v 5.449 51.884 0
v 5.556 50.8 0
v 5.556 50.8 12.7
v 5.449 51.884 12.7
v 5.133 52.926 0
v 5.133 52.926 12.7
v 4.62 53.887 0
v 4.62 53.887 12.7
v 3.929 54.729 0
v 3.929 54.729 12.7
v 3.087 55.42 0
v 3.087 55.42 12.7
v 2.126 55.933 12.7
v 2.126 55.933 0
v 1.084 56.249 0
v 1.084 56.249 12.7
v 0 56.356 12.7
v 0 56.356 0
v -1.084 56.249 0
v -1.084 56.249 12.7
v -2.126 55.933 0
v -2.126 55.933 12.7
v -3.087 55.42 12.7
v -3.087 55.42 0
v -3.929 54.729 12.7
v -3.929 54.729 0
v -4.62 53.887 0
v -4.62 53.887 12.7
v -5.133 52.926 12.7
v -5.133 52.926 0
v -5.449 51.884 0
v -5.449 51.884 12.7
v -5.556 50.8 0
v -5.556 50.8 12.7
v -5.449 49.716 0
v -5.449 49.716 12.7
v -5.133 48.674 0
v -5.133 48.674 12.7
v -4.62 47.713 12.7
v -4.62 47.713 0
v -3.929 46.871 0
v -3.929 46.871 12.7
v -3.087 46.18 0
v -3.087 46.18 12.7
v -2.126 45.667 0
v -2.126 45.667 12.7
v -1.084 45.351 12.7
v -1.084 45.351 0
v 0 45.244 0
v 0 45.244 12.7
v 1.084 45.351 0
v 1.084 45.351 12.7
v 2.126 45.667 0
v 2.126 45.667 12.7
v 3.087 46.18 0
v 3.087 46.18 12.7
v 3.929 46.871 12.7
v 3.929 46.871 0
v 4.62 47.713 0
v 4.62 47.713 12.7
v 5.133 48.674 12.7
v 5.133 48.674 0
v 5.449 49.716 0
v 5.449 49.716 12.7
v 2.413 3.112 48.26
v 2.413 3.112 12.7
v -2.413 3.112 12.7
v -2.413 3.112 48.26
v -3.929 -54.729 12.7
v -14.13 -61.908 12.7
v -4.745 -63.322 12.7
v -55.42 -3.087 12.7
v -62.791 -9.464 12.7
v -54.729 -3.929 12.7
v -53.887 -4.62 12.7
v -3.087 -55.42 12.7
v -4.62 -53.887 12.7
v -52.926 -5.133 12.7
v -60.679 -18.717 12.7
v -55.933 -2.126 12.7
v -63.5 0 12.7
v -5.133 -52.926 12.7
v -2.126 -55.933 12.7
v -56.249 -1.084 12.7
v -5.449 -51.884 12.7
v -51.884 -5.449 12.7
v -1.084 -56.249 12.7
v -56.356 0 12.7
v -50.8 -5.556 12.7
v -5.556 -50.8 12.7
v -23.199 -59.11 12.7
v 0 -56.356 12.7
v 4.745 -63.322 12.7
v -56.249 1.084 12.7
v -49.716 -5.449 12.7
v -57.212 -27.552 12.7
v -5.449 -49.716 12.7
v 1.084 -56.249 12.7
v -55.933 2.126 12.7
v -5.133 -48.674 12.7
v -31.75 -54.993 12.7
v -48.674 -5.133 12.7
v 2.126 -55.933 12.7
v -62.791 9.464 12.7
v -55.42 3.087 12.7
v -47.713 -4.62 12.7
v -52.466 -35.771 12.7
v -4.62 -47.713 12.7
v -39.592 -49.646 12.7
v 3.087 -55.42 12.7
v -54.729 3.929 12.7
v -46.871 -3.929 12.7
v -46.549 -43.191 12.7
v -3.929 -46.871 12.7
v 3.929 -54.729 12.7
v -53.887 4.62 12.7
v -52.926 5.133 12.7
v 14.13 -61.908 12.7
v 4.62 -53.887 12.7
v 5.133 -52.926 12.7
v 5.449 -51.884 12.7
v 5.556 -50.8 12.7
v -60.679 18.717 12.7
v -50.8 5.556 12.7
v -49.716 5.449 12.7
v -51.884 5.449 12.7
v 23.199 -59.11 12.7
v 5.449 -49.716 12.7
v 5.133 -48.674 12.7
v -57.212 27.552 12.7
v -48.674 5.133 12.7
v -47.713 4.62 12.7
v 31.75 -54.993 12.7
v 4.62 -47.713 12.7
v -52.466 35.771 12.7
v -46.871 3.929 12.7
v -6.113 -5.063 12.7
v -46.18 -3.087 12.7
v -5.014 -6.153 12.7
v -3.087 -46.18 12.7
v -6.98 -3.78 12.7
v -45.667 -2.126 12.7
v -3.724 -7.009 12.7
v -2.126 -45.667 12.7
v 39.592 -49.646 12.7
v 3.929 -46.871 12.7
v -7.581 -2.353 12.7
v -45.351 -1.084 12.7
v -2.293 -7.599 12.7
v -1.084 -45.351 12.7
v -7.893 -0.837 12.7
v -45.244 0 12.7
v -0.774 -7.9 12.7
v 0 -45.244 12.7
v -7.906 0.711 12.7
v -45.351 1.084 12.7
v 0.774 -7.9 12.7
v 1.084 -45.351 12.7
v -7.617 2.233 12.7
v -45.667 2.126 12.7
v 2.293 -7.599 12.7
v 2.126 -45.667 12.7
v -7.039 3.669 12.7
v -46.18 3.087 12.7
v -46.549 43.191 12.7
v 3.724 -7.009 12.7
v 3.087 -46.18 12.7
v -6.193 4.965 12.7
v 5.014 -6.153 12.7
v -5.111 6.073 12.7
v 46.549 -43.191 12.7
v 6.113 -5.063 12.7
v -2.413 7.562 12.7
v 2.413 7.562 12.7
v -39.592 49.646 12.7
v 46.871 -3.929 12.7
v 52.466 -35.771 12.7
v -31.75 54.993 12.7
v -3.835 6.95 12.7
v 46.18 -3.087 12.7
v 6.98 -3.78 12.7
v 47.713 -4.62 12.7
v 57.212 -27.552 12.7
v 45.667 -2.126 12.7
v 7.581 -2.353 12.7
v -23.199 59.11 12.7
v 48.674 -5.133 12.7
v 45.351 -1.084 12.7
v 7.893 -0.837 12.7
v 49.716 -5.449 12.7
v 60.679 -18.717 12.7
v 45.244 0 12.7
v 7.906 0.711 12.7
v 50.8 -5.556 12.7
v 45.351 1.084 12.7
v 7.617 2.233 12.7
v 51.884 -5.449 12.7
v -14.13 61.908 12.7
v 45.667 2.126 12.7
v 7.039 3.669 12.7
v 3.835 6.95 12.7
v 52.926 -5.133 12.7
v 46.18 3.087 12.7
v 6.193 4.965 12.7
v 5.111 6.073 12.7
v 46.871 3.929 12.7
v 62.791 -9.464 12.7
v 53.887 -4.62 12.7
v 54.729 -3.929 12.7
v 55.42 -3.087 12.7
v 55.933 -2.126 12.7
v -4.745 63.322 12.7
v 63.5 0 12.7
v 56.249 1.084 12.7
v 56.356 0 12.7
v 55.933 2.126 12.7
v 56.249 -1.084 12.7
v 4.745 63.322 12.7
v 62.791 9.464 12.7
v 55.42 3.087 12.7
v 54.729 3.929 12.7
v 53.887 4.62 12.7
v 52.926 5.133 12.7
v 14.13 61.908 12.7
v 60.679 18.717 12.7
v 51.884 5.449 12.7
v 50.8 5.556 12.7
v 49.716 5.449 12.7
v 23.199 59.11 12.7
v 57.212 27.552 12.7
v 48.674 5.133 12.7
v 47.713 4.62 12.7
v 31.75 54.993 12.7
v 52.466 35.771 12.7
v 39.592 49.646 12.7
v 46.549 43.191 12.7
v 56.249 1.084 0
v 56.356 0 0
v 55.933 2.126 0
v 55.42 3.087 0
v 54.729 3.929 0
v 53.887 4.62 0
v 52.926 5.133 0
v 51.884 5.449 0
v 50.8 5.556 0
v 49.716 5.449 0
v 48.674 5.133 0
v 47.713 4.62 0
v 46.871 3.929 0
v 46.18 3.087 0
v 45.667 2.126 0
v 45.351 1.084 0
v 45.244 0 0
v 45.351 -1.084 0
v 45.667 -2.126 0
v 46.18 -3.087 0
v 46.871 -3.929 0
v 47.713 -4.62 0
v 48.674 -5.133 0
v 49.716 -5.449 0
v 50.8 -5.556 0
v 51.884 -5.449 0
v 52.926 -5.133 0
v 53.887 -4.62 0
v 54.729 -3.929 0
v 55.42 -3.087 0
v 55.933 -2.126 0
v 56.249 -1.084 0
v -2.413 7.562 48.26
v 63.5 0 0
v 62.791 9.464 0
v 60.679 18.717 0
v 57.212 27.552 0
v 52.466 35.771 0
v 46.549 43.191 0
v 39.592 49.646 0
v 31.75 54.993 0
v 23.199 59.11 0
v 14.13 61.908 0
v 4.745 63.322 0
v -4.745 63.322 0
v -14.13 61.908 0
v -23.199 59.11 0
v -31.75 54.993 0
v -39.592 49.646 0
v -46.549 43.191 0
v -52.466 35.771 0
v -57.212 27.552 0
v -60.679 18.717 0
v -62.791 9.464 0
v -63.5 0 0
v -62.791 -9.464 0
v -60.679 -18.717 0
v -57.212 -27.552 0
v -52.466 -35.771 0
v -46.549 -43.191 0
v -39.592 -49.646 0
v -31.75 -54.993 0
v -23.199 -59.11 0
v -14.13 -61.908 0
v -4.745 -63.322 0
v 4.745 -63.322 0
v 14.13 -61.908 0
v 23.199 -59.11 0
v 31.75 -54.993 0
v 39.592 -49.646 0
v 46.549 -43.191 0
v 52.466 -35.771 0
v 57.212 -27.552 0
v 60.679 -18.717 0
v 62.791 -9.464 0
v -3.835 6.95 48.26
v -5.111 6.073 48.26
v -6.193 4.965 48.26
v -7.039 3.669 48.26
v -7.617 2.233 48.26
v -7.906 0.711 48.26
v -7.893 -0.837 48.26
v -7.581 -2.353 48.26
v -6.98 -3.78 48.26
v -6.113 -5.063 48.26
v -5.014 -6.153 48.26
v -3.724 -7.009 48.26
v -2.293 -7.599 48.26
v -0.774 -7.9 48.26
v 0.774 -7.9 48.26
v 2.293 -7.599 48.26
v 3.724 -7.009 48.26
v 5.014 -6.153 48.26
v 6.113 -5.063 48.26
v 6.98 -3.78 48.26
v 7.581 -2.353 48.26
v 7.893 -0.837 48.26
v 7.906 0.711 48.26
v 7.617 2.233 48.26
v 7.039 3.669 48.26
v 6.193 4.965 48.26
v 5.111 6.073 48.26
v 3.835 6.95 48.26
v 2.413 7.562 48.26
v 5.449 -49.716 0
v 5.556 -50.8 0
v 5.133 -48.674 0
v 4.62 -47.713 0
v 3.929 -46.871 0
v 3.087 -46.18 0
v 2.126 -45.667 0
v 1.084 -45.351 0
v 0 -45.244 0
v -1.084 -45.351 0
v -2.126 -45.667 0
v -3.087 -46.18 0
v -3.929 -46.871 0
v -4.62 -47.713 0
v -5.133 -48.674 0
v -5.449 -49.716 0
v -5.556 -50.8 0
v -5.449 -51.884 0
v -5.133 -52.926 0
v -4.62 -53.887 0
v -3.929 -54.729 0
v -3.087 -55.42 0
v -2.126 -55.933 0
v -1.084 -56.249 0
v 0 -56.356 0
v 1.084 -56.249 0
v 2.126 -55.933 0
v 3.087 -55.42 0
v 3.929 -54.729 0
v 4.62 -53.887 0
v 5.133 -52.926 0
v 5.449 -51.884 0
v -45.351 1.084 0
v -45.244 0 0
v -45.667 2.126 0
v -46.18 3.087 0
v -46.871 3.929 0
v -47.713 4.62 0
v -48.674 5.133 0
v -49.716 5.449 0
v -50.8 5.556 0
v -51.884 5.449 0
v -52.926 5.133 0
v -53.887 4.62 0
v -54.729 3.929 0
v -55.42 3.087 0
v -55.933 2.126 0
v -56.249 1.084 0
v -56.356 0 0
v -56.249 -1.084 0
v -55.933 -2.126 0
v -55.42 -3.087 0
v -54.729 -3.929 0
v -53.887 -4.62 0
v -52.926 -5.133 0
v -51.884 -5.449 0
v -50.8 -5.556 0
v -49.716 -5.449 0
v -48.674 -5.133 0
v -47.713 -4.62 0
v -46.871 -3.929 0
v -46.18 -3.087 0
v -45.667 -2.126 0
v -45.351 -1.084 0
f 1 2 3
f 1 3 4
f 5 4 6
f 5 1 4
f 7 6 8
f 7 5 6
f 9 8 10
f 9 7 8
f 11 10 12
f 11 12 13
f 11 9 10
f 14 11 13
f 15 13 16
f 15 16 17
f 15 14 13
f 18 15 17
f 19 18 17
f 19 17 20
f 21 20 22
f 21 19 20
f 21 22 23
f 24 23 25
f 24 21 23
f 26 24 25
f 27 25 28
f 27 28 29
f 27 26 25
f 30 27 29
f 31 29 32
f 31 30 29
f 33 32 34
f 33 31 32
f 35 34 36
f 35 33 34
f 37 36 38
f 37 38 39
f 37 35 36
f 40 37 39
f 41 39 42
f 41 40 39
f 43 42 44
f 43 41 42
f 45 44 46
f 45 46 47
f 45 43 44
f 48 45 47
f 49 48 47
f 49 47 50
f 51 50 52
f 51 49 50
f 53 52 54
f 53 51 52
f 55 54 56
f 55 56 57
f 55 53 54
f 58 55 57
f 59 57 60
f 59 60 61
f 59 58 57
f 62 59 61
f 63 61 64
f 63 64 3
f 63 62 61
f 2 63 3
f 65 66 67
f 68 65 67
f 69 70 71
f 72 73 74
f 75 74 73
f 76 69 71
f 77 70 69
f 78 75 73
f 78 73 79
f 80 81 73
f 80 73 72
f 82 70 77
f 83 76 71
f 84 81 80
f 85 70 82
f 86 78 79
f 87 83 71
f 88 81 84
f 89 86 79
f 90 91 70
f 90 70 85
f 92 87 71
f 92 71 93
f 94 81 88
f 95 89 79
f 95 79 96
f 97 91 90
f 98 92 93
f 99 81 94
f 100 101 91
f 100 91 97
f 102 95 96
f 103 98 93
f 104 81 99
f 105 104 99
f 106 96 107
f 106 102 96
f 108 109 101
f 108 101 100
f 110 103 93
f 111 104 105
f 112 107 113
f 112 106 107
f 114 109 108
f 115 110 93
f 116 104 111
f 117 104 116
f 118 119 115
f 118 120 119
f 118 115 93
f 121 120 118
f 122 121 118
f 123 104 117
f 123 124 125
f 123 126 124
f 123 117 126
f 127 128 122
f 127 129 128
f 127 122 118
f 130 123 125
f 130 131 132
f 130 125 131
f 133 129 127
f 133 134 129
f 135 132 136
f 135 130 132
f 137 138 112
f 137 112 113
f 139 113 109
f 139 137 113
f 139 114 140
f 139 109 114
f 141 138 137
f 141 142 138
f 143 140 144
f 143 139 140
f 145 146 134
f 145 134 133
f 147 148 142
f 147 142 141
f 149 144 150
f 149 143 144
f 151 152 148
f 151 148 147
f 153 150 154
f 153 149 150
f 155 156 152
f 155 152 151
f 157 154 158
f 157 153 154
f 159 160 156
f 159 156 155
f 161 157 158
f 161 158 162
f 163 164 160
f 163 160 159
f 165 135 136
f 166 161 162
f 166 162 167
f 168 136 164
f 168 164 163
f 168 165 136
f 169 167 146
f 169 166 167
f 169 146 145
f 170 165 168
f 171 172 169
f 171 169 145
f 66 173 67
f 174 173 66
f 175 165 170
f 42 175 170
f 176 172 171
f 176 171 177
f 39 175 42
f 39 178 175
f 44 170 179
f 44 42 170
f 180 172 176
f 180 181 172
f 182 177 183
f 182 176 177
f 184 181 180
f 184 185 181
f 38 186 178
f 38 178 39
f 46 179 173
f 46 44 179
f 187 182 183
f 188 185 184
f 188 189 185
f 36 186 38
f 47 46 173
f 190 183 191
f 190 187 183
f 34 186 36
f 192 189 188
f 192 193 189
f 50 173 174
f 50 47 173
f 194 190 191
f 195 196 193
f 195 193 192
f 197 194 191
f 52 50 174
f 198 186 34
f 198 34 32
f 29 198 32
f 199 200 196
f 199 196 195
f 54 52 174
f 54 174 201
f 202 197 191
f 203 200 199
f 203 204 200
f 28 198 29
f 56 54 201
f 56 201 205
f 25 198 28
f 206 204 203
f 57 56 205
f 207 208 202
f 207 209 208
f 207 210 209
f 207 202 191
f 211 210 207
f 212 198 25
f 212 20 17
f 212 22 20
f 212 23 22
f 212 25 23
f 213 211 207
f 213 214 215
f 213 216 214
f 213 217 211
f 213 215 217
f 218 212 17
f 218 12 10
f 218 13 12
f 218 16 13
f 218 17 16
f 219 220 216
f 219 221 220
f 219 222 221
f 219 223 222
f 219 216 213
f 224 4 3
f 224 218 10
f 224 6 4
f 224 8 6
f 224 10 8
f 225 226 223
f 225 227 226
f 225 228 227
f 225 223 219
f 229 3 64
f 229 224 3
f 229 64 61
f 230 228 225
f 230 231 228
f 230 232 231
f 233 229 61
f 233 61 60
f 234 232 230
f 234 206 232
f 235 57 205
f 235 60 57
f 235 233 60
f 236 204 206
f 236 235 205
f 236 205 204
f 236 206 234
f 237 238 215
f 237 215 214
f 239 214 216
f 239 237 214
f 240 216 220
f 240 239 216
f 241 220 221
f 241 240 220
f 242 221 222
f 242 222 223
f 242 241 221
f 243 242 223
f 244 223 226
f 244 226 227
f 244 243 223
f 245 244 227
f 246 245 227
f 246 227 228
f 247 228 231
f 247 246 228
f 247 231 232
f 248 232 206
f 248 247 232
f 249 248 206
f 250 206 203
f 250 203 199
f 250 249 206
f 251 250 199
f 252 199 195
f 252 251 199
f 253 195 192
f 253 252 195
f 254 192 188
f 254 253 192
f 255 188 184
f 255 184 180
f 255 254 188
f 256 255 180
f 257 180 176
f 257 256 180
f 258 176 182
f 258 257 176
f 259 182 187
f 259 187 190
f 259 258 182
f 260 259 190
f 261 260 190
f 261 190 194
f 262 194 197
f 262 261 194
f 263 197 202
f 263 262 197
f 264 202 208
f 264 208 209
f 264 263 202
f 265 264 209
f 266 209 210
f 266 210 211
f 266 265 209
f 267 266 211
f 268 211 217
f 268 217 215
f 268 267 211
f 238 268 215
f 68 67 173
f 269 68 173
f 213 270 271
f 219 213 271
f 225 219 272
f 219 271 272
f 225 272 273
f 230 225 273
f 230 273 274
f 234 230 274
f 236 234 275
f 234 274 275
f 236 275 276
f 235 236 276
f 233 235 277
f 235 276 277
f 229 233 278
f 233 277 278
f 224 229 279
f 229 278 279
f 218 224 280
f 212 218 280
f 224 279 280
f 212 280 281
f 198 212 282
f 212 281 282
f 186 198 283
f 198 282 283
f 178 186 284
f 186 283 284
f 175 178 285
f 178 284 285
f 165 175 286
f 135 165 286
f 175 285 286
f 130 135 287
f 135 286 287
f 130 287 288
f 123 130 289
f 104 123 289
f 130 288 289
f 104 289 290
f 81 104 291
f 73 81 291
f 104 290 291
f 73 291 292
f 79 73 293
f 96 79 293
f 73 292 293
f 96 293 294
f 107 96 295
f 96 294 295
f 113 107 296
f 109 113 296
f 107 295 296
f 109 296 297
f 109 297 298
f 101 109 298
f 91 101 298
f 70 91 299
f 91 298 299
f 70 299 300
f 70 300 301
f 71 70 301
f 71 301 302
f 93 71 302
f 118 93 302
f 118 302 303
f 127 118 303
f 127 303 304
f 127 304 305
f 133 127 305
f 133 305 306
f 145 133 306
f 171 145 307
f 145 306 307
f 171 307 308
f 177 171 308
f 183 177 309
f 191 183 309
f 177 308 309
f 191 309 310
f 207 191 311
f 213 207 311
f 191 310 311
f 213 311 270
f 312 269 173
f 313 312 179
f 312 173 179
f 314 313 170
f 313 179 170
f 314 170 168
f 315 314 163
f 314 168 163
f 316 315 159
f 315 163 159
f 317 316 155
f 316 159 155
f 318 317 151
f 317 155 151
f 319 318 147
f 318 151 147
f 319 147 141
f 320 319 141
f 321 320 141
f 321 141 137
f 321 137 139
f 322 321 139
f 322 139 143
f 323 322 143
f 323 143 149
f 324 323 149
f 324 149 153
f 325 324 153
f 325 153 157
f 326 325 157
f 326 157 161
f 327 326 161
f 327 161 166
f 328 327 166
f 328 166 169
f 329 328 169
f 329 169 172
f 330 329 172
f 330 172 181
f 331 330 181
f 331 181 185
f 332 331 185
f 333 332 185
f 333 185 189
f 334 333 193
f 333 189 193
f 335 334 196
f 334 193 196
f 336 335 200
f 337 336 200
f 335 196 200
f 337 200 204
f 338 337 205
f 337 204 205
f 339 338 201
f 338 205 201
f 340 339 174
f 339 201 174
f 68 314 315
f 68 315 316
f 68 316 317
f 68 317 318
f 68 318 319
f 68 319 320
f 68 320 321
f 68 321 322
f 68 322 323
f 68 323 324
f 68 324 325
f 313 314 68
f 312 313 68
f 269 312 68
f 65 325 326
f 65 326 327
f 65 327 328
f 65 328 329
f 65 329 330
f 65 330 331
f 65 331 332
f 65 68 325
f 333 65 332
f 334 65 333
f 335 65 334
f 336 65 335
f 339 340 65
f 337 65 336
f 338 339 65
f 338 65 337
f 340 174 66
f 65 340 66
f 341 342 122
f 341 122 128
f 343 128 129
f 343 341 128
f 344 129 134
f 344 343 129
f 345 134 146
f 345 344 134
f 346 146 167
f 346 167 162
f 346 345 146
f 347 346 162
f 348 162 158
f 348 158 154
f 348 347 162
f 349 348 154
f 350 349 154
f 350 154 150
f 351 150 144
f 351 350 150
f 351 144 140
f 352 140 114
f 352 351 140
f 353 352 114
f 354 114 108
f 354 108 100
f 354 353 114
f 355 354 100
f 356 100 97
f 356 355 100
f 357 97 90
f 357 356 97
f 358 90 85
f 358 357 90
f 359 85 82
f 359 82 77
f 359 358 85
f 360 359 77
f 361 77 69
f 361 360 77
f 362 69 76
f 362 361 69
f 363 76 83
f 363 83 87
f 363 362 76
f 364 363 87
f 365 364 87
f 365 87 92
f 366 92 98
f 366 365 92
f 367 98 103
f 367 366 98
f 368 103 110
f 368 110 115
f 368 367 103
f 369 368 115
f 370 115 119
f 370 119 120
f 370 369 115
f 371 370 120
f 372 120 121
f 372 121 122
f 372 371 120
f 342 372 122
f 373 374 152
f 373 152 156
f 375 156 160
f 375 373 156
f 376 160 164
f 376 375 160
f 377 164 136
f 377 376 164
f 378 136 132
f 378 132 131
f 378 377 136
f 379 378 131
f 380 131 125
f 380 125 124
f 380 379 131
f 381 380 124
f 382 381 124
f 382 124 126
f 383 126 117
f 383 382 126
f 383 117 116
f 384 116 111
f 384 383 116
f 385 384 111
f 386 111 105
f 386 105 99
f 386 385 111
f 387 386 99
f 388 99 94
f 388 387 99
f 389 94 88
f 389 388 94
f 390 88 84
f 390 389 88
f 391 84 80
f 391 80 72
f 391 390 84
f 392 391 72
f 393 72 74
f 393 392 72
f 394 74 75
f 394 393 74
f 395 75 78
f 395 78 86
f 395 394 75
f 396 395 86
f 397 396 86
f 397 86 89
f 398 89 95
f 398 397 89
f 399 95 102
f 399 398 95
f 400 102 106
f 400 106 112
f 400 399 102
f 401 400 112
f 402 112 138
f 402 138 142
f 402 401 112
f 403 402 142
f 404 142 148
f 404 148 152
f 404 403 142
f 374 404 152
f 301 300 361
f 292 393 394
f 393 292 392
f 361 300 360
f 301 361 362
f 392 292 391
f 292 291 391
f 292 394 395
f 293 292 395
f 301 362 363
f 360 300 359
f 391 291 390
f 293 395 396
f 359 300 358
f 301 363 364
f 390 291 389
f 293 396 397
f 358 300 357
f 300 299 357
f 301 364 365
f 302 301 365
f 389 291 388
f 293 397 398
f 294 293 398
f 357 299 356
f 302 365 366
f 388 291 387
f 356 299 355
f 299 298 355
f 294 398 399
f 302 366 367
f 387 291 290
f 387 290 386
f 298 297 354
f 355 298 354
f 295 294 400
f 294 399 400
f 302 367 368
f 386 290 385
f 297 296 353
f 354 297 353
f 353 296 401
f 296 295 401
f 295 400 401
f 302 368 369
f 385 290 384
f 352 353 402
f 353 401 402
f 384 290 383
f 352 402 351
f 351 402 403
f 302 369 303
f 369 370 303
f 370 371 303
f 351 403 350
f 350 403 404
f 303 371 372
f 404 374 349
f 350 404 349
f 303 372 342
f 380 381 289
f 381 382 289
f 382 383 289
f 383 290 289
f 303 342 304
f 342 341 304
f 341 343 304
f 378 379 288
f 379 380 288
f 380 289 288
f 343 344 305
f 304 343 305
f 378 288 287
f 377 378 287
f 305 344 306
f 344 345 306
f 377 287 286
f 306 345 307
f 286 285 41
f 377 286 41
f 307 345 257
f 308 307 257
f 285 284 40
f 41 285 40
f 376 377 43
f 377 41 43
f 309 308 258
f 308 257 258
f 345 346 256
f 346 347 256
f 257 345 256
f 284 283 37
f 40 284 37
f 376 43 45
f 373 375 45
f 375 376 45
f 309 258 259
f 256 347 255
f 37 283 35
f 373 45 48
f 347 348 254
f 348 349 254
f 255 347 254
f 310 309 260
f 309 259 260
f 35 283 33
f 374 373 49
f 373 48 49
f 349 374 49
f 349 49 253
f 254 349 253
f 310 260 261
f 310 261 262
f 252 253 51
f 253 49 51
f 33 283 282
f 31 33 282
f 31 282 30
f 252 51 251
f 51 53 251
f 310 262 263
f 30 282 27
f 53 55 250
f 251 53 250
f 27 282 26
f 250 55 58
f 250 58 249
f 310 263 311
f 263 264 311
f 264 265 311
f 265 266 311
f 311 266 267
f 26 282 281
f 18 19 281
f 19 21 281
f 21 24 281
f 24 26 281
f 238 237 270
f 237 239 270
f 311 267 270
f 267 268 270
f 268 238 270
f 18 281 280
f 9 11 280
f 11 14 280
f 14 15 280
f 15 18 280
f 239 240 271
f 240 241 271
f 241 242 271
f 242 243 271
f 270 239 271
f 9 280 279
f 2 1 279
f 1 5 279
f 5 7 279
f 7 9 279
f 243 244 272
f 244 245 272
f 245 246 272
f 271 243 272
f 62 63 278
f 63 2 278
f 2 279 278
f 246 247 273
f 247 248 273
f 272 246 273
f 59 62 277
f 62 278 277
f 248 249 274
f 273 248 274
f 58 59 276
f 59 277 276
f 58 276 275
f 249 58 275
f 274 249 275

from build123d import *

# Parameters (mm, degrees)
SKETCH1_R           = 63.5
SKETCH1_R_2         = 5.55625
BOSS_EXTRUDE1_DEPTH = 12.7
BOSS_EXTRUDE5_DEPTH = 48.26


with BuildPart() as part:
    # Sketch1 → Boss-Extrude1 (new body)
    with BuildSketch(Plane.XY):
        Circle(SKETCH1_R)
        with Locations((-50.8, 0)):
            Circle(SKETCH1_R_2, mode=Mode.SUBTRACT)
        with Locations((0, 50.8)):
            Circle(SKETCH1_R_2, mode=Mode.SUBTRACT)
        with Locations((50.8, 0)):
            Circle(SKETCH1_R_2, mode=Mode.SUBTRACT)
        with Locations((0, -50.8)):
            Circle(SKETCH1_R_2, mode=Mode.SUBTRACT)
    extrude(amount=BOSS_EXTRUDE1_DEPTH)

    # Sketch2 → Boss-Extrude5 (add)
    with BuildSketch(Plane(origin=(0, 0, 0), x_dir=(-1, 0, 0), z_dir=(0, 0, -1))):
        with BuildLine():
            Line((-2.413, 7.561834252), (-2.413, 3.1115))
            Line((-2.413, 3.1115), (2.413, 3.1115))
            Line((2.413, 3.1115), (2.413, 7.561834252))
            ThreePointArc((2.413, 7.561834252), (0, -7.9375), (-2.413, 7.561834252))
        make_face()
    extrude(amount=-BOSS_EXTRUDE5_DEPTH)


solid = part.part
